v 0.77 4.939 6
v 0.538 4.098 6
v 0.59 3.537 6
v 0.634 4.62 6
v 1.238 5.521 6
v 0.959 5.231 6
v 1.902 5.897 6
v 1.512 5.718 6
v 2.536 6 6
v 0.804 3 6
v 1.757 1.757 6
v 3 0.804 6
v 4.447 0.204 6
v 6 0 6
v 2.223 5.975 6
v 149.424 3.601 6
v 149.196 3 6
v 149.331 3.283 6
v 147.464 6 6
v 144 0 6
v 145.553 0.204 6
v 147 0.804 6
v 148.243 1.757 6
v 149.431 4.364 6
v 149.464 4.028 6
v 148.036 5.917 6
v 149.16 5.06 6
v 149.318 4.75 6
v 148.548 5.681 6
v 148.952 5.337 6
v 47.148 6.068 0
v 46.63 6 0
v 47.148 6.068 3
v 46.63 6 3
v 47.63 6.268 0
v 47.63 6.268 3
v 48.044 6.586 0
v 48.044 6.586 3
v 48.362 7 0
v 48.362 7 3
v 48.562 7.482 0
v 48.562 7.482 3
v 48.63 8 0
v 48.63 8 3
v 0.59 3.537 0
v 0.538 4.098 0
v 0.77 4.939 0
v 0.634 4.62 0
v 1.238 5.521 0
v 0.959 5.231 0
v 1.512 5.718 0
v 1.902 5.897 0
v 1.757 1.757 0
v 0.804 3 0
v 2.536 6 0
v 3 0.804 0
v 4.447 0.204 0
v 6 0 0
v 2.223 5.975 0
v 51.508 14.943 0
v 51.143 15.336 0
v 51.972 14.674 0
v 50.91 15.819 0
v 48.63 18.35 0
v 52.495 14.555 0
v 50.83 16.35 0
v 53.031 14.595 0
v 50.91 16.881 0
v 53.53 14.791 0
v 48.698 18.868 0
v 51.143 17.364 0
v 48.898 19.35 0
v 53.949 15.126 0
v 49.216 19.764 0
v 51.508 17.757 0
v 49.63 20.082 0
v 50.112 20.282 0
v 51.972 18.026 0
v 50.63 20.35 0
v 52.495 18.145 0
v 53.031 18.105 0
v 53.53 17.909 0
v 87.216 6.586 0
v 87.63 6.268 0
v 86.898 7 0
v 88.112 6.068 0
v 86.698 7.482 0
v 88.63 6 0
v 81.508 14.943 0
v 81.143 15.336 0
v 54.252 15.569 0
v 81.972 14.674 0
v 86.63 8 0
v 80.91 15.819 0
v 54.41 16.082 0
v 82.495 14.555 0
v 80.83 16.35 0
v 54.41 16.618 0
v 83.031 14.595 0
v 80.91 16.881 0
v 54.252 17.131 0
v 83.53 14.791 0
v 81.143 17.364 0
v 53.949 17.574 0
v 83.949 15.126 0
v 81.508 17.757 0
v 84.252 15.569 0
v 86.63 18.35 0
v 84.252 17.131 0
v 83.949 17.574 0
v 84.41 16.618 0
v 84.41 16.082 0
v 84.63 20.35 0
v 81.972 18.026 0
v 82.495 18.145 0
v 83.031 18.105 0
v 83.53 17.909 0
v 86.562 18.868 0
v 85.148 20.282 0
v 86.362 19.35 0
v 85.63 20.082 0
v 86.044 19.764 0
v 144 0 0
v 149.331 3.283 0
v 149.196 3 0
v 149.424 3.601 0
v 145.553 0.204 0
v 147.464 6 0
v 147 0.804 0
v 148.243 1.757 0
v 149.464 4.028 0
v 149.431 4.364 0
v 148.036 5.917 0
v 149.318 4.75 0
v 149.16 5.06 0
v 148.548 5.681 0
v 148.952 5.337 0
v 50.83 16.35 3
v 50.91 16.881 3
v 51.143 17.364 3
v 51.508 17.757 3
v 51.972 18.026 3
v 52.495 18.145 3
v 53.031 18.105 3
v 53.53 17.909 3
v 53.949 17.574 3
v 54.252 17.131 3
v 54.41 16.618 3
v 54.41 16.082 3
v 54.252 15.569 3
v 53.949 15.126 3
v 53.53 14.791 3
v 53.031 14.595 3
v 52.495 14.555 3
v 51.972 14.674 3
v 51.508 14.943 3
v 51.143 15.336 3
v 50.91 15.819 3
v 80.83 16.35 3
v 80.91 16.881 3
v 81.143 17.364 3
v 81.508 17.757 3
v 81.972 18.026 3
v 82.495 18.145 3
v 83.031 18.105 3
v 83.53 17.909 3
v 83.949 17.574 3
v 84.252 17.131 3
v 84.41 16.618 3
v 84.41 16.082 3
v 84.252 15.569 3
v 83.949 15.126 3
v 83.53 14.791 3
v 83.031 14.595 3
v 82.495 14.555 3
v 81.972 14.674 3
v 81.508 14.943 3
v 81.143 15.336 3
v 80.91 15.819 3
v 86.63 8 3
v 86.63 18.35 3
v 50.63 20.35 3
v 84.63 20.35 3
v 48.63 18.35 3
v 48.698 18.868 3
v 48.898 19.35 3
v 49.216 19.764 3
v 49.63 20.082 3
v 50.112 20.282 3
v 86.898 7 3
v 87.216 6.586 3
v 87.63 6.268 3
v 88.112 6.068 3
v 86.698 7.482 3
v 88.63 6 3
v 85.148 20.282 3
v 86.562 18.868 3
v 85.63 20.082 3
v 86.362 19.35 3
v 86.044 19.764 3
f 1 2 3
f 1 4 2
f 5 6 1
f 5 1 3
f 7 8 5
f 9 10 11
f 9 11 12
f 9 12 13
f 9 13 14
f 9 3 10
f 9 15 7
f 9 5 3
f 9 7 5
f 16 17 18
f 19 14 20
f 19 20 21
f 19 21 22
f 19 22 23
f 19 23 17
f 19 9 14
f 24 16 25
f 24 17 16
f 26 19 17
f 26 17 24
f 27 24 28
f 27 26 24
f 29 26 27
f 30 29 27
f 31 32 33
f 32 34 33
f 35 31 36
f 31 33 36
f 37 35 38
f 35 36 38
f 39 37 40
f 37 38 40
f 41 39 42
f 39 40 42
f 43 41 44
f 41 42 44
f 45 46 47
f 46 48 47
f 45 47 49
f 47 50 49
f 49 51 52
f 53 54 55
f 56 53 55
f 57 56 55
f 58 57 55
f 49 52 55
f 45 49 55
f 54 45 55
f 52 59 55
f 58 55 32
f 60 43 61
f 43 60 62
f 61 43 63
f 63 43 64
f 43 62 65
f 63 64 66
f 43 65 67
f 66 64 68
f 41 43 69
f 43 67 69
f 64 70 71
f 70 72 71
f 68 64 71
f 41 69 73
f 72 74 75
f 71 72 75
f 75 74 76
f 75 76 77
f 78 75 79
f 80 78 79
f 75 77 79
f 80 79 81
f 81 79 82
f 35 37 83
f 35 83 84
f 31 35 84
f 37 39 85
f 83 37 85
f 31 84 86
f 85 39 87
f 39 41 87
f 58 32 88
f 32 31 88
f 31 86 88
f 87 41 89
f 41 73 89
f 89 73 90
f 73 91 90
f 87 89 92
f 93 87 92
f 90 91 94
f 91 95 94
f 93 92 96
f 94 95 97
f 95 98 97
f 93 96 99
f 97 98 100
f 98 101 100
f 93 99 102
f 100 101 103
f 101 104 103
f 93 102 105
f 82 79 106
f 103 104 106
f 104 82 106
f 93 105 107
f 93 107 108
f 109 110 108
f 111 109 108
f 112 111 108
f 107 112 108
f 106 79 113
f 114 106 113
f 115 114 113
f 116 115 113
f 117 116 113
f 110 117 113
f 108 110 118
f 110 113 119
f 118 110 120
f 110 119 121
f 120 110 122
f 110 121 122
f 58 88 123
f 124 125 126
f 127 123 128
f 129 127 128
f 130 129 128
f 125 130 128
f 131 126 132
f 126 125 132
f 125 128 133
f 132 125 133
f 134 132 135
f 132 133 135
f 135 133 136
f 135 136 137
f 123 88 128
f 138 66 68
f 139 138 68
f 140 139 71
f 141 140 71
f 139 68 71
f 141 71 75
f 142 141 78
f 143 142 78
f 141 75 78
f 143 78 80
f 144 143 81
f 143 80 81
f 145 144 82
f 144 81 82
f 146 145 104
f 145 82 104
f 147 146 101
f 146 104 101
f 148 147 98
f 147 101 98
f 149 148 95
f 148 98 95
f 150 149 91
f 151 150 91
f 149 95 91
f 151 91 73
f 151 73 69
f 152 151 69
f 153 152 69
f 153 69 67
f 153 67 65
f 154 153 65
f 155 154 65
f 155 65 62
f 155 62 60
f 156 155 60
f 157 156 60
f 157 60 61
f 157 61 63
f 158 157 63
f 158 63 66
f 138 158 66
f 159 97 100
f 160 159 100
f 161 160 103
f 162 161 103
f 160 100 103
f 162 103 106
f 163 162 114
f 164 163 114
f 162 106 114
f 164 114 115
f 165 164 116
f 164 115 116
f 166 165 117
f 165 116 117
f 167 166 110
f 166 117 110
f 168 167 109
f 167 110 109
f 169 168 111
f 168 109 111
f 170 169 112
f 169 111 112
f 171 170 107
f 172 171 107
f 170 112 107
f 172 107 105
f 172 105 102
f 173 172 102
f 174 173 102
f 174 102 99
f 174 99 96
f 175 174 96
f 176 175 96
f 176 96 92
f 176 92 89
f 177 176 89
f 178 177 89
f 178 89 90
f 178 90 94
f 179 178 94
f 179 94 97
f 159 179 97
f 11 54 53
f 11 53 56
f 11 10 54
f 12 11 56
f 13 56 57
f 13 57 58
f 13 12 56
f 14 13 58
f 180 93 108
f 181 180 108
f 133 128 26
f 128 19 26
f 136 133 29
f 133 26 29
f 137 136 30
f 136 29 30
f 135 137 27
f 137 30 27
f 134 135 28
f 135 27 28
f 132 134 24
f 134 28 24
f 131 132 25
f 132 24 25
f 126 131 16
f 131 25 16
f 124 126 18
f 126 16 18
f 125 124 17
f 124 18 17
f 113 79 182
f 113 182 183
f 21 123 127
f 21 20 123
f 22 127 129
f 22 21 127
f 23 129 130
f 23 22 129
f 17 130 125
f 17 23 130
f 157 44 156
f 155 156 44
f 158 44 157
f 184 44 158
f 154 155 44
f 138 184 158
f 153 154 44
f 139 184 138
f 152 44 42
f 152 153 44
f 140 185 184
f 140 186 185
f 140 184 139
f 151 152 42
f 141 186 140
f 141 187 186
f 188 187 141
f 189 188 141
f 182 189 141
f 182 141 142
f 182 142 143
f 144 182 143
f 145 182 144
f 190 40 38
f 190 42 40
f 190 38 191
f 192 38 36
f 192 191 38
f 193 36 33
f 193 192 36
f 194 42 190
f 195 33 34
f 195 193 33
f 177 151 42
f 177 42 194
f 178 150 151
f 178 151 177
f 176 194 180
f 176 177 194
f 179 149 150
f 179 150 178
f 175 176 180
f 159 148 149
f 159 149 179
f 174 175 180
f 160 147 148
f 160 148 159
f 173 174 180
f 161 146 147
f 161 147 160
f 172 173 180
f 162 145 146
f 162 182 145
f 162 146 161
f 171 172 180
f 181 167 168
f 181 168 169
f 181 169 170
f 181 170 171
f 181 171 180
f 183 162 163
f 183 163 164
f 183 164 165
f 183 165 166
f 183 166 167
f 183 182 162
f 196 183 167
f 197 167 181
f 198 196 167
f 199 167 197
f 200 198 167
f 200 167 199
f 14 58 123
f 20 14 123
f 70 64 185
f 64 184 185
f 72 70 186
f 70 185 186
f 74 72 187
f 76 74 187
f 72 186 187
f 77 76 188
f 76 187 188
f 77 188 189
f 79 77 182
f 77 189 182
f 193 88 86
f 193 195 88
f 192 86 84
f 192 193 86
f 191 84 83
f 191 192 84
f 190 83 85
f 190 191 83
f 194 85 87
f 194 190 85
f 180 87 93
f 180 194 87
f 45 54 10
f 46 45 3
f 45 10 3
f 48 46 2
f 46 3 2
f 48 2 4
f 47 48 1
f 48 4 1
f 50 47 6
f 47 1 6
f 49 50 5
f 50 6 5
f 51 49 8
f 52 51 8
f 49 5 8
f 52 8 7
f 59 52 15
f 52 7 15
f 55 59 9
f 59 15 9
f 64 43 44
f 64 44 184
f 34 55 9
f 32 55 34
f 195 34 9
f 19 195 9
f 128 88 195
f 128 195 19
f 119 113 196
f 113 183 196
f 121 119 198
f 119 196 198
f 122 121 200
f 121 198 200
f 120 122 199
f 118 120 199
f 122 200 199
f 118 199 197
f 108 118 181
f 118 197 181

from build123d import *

# Parameters (mm, degrees)
SKETCH1_W            = 150
SKETCH1_H            = 6
BOSS_EXTRUDE1_DEPTH  = 6
SKETCH1_3_W          = 38
SKETCH1_3_H          = 14.35
BOSS_EXTRUDE2_DEPTH  = 3
M3_CLEARANCE_HOLE1_D = 3.6
FILLET1_R            = 6
FILLET2_R            = 2


with BuildPart() as part:
    # Sketch1 → Boss-Extrude1 (new body)
    with BuildSketch(Plane.XY):
        with Locations((75, 3)):
            Rectangle(SKETCH1_W, SKETCH1_H)
    extrude(amount=BOSS_EXTRUDE1_DEPTH)

    # Sketch1<3> → Boss-Extrude2 (add)
    with BuildSketch(Plane.XY):
        with Locations((67.63, 13.175)):
            Rectangle(SKETCH1_3_W, SKETCH1_3_H)
    extrude(amount=BOSS_EXTRUDE2_DEPTH)

    # M3 Clearance Hole1 (through all)
    with Locations(Plane.XY.offset(3)):
        with Locations((52.63, 16.35), (82.63, 16.35)):
            Hole(M3_CLEARANCE_HOLE1_D / 2)

    # Fillet1
    fillet1_edges = [part.edges().sort_by_distance(p)[0] for p in [
        (150, 0, 3),
        (0, 0, 3),
    ]]
    fillet(fillet1_edges, radius=FILLET1_R - 0.0001)  # a hair under: the kernel refuses the full size

    # Fillet2
    fillet2_edges = [part.edges().sort_by_distance(p)[0] for p in [
        (86.63, 6, 1.5),
        (86.63, 20.35, 1.5),
        (48.63, 20.35, 1.5),
        (48.63, 6, 1.5),
        (0, 6, 3),
        (150, 6, 3),
    ]]
    fillet(fillet2_edges, radius=FILLET2_R)


solid = part.part
